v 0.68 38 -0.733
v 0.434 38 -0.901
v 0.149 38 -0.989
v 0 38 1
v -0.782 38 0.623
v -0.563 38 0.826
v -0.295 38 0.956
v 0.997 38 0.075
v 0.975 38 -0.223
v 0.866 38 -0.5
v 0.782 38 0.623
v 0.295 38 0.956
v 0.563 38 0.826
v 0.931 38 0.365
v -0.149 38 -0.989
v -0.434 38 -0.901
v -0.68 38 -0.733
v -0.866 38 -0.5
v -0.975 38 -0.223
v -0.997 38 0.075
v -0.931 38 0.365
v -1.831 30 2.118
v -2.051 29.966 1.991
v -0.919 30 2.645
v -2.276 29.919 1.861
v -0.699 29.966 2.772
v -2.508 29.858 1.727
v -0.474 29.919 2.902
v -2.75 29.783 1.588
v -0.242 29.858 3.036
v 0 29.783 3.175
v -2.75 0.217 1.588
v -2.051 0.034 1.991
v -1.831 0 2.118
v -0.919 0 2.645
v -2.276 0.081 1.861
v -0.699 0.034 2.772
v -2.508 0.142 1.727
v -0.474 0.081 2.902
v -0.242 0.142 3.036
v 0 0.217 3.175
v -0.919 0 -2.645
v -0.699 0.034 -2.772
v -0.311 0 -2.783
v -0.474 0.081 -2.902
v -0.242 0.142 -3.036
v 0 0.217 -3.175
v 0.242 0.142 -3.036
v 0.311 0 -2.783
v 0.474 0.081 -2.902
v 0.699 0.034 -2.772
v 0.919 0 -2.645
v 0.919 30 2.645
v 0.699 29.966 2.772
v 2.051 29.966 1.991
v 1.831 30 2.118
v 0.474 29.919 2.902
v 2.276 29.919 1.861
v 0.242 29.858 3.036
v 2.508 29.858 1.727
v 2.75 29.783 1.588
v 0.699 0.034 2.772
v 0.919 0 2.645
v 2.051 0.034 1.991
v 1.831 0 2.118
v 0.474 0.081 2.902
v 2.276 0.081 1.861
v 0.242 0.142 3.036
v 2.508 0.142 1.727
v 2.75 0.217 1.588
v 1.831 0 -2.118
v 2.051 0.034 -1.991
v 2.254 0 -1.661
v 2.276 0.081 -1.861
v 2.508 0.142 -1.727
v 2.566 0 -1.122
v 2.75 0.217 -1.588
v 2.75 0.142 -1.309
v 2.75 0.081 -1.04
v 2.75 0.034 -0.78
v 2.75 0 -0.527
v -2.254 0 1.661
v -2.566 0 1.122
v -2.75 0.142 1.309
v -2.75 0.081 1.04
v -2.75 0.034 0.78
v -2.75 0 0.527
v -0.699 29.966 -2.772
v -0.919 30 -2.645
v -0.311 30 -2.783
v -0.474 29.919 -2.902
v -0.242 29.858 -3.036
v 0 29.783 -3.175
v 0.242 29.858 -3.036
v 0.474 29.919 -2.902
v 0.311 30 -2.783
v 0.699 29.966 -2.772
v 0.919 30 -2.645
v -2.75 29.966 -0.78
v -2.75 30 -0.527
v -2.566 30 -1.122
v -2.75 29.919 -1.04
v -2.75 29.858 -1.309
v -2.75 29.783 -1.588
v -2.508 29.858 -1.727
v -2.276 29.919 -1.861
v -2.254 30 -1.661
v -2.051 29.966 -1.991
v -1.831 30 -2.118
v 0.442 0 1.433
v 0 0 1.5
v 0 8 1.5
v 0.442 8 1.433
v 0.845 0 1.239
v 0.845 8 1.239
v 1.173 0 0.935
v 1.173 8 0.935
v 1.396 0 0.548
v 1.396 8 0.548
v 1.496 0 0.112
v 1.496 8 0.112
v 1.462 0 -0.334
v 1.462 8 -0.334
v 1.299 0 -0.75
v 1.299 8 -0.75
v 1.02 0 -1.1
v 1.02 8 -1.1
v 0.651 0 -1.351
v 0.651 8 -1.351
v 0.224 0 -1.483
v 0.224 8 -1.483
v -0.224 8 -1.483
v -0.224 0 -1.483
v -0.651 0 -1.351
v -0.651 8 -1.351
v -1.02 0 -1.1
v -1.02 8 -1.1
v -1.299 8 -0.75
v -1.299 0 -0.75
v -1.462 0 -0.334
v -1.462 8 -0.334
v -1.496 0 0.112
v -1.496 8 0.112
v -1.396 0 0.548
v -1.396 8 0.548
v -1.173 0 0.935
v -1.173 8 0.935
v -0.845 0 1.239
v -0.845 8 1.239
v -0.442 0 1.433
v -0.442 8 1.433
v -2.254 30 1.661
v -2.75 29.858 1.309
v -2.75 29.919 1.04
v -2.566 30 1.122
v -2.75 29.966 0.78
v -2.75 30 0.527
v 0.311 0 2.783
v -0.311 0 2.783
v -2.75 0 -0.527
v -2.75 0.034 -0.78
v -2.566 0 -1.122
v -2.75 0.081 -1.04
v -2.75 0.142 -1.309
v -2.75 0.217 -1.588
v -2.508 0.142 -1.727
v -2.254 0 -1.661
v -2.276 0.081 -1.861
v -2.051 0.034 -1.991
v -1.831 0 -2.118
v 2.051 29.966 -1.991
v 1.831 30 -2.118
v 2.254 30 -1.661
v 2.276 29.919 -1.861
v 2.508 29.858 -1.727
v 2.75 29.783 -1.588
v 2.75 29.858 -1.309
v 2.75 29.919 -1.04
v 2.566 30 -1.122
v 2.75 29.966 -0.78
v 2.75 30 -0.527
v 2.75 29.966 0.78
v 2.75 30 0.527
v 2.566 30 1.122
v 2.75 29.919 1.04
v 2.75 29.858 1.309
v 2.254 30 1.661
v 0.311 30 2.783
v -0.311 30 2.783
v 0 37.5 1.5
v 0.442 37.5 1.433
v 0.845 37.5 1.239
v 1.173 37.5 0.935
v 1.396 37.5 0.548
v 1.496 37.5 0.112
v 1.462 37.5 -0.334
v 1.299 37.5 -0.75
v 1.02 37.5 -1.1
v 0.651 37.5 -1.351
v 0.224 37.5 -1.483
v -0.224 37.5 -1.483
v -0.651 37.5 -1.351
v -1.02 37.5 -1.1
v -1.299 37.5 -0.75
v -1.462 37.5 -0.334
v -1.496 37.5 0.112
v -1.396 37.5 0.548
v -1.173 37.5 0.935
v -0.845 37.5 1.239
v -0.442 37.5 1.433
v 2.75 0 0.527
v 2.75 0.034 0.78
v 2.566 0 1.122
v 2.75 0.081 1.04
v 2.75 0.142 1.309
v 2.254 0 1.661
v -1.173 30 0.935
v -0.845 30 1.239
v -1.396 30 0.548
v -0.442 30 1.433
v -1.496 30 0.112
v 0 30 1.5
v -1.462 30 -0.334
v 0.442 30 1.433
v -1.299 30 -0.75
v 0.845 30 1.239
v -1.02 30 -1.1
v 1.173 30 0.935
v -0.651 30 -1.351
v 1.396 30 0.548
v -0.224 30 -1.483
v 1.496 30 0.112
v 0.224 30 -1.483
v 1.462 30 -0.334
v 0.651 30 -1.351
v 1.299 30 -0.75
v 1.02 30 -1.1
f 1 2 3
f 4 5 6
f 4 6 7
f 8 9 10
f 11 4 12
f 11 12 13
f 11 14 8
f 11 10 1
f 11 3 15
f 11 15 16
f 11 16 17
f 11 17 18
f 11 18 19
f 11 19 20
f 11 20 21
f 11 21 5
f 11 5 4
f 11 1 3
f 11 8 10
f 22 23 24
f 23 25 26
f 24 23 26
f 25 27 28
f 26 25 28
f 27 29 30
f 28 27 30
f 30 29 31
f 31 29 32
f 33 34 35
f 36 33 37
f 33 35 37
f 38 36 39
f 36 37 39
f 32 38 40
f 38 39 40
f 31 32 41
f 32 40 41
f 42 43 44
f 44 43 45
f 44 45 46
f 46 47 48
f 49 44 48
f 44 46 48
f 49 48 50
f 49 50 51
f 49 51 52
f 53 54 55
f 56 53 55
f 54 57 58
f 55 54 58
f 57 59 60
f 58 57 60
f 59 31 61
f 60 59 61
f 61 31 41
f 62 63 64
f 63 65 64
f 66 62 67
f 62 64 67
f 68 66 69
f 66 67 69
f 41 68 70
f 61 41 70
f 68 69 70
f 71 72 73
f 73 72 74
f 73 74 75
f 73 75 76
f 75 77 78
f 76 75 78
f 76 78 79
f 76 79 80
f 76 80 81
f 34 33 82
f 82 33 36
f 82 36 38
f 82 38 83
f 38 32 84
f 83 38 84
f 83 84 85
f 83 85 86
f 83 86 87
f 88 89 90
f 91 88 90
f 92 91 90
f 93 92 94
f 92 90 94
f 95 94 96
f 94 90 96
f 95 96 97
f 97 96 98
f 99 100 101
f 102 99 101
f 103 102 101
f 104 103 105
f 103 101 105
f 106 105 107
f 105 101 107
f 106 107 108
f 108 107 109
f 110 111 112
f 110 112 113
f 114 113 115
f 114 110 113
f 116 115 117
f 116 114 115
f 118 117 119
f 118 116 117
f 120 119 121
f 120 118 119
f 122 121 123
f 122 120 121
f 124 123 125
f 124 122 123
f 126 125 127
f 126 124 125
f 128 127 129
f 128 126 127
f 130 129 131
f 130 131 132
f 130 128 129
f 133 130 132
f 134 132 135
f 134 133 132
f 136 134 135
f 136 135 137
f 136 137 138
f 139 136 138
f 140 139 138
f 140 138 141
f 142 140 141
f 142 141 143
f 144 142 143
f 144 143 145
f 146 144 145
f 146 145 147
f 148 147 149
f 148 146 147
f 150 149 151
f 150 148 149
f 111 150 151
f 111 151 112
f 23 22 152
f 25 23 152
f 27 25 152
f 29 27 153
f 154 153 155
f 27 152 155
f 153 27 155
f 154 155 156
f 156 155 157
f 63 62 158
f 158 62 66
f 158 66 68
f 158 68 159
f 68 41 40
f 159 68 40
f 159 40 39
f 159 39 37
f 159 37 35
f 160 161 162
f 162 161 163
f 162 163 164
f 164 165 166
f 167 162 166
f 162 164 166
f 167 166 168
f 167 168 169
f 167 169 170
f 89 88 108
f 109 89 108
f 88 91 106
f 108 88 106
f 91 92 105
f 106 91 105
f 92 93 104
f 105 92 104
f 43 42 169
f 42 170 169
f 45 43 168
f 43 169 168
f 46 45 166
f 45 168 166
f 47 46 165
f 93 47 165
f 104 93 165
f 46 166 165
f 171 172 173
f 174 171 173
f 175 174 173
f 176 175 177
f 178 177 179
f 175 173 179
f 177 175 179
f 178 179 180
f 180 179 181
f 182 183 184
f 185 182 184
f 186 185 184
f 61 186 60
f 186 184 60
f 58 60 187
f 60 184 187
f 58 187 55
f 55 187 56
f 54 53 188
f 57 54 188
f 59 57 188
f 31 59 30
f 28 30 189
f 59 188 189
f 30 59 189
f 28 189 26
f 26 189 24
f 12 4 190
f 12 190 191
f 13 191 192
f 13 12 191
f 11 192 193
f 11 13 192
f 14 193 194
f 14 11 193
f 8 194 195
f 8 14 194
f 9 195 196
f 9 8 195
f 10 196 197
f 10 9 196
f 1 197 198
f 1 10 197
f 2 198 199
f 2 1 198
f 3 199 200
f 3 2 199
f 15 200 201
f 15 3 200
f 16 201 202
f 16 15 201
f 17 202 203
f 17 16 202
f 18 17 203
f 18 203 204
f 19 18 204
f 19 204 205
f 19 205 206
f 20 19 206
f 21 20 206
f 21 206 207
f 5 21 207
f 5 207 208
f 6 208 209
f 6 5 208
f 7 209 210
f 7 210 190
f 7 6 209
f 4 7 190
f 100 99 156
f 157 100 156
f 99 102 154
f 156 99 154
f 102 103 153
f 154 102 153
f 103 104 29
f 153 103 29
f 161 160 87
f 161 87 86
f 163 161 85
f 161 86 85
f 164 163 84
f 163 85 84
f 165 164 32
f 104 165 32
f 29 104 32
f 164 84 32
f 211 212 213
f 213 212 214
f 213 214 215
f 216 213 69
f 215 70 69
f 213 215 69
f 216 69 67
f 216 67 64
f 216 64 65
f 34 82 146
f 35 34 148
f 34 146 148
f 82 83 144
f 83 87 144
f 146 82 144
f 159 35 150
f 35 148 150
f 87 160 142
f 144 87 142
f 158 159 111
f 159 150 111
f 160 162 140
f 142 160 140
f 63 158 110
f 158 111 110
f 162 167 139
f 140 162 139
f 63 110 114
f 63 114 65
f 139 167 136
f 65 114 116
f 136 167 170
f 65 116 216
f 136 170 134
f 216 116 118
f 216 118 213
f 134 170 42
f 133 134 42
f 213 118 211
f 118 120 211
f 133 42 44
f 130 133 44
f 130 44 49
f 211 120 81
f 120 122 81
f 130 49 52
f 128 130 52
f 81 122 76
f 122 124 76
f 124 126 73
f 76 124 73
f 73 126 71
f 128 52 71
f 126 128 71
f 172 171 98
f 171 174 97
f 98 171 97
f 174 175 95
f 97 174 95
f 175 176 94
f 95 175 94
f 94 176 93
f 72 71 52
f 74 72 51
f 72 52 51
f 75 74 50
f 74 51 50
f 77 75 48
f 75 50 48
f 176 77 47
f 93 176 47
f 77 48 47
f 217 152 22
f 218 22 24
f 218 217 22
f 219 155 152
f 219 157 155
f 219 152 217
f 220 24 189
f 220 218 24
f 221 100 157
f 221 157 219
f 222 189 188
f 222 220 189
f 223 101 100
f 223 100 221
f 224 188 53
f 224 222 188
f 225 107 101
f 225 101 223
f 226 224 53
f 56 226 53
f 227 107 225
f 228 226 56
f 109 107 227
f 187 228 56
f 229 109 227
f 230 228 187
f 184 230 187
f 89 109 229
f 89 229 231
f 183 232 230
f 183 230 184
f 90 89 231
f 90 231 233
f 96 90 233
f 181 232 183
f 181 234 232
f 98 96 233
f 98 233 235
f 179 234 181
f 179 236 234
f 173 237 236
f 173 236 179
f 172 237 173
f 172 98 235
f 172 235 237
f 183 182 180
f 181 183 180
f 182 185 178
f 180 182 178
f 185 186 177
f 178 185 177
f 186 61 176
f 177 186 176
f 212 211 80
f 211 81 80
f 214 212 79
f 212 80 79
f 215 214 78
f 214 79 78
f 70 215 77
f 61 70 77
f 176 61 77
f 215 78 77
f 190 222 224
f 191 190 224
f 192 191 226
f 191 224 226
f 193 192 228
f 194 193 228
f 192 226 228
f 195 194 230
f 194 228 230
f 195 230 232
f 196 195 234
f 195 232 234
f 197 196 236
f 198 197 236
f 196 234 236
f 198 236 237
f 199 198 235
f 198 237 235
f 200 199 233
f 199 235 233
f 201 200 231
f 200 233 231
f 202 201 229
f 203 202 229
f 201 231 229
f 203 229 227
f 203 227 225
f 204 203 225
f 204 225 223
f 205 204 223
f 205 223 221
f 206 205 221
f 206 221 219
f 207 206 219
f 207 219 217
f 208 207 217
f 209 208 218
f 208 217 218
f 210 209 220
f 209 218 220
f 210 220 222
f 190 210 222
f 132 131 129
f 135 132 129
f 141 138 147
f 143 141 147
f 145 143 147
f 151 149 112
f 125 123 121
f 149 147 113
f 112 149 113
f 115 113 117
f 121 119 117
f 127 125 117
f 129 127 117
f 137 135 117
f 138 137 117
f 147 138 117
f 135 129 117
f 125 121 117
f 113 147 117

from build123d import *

# Parameters (mm, degrees)
EXTRUDE_1_DEPTH     = 30
SKETCH_3_R          = 1.5
EXTRUDE_2_DEPTH     = 8
CHAMFER_1_SIZE      = 0.5
SKETCH_1_3_R        = 1.5
CUT_EXTRUDE_1_DEPTH = 8


with BuildPart() as part:
    # Эскиз1 → Бобышка-Вытянуть1 (new body)
    with BuildSketch(Plane(origin=(0, 0, 0), x_dir=(1, 0, 0), z_dir=(0, 1, 0))):
        Polygon((2.75, 1.58771324), (0, 3.175426481), (-2.75, 1.58771324), (-2.75, -1.58771324), (0, -3.175426481), (2.75, -1.58771324), align=None)
    extrude(amount=EXTRUDE_1_DEPTH)

    # Эскиз2 → Вырез-Повернуть1 (revolve, cut)
    with BuildSketch(Plane(origin=(0, 0, 0), x_dir=(0, 0, -1), z_dir=(1, 0, 0))):
        Polygon((-26.160719749, 0), (-2.8, 0), (-26.160719749, 13.487317835), align=None)
        Polygon((-26.160719749, 16.512682165), (-2.8, 30), (-26.160719749, 30), align=None)
    revolve(axis=Axis((0, 30, 0), (0, -1, 0)), mode=Mode.SUBTRACT)

    # Эскиз3 → Бобышка-Вытянуть2 (add)
    with BuildSketch(Plane(origin=(0, 30, 0), x_dir=(1, 0, 0), z_dir=(0, 1, 0))):
        Circle(SKETCH_3_R)
    extrude(amount=EXTRUDE_2_DEPTH)

    # Фаска1
    chamfer_1_edges = [part.edges().sort_by_distance(p)[0] for p in [
        (-1.5, 38, 0),
    ]]
    chamfer(chamfer_1_edges, length=CHAMFER_1_SIZE)

    # Эскиз1<3> → Вырез-Вытянуть1 (cut)
    with BuildSketch(Plane(origin=(0, 0, 0), x_dir=(1, 0, 0), z_dir=(0, 1, 0))):
        Circle(SKETCH_1_3_R)
    extrude(amount=CUT_EXTRUDE_1_DEPTH, mode=Mode.SUBTRACT)


solid = part.part
